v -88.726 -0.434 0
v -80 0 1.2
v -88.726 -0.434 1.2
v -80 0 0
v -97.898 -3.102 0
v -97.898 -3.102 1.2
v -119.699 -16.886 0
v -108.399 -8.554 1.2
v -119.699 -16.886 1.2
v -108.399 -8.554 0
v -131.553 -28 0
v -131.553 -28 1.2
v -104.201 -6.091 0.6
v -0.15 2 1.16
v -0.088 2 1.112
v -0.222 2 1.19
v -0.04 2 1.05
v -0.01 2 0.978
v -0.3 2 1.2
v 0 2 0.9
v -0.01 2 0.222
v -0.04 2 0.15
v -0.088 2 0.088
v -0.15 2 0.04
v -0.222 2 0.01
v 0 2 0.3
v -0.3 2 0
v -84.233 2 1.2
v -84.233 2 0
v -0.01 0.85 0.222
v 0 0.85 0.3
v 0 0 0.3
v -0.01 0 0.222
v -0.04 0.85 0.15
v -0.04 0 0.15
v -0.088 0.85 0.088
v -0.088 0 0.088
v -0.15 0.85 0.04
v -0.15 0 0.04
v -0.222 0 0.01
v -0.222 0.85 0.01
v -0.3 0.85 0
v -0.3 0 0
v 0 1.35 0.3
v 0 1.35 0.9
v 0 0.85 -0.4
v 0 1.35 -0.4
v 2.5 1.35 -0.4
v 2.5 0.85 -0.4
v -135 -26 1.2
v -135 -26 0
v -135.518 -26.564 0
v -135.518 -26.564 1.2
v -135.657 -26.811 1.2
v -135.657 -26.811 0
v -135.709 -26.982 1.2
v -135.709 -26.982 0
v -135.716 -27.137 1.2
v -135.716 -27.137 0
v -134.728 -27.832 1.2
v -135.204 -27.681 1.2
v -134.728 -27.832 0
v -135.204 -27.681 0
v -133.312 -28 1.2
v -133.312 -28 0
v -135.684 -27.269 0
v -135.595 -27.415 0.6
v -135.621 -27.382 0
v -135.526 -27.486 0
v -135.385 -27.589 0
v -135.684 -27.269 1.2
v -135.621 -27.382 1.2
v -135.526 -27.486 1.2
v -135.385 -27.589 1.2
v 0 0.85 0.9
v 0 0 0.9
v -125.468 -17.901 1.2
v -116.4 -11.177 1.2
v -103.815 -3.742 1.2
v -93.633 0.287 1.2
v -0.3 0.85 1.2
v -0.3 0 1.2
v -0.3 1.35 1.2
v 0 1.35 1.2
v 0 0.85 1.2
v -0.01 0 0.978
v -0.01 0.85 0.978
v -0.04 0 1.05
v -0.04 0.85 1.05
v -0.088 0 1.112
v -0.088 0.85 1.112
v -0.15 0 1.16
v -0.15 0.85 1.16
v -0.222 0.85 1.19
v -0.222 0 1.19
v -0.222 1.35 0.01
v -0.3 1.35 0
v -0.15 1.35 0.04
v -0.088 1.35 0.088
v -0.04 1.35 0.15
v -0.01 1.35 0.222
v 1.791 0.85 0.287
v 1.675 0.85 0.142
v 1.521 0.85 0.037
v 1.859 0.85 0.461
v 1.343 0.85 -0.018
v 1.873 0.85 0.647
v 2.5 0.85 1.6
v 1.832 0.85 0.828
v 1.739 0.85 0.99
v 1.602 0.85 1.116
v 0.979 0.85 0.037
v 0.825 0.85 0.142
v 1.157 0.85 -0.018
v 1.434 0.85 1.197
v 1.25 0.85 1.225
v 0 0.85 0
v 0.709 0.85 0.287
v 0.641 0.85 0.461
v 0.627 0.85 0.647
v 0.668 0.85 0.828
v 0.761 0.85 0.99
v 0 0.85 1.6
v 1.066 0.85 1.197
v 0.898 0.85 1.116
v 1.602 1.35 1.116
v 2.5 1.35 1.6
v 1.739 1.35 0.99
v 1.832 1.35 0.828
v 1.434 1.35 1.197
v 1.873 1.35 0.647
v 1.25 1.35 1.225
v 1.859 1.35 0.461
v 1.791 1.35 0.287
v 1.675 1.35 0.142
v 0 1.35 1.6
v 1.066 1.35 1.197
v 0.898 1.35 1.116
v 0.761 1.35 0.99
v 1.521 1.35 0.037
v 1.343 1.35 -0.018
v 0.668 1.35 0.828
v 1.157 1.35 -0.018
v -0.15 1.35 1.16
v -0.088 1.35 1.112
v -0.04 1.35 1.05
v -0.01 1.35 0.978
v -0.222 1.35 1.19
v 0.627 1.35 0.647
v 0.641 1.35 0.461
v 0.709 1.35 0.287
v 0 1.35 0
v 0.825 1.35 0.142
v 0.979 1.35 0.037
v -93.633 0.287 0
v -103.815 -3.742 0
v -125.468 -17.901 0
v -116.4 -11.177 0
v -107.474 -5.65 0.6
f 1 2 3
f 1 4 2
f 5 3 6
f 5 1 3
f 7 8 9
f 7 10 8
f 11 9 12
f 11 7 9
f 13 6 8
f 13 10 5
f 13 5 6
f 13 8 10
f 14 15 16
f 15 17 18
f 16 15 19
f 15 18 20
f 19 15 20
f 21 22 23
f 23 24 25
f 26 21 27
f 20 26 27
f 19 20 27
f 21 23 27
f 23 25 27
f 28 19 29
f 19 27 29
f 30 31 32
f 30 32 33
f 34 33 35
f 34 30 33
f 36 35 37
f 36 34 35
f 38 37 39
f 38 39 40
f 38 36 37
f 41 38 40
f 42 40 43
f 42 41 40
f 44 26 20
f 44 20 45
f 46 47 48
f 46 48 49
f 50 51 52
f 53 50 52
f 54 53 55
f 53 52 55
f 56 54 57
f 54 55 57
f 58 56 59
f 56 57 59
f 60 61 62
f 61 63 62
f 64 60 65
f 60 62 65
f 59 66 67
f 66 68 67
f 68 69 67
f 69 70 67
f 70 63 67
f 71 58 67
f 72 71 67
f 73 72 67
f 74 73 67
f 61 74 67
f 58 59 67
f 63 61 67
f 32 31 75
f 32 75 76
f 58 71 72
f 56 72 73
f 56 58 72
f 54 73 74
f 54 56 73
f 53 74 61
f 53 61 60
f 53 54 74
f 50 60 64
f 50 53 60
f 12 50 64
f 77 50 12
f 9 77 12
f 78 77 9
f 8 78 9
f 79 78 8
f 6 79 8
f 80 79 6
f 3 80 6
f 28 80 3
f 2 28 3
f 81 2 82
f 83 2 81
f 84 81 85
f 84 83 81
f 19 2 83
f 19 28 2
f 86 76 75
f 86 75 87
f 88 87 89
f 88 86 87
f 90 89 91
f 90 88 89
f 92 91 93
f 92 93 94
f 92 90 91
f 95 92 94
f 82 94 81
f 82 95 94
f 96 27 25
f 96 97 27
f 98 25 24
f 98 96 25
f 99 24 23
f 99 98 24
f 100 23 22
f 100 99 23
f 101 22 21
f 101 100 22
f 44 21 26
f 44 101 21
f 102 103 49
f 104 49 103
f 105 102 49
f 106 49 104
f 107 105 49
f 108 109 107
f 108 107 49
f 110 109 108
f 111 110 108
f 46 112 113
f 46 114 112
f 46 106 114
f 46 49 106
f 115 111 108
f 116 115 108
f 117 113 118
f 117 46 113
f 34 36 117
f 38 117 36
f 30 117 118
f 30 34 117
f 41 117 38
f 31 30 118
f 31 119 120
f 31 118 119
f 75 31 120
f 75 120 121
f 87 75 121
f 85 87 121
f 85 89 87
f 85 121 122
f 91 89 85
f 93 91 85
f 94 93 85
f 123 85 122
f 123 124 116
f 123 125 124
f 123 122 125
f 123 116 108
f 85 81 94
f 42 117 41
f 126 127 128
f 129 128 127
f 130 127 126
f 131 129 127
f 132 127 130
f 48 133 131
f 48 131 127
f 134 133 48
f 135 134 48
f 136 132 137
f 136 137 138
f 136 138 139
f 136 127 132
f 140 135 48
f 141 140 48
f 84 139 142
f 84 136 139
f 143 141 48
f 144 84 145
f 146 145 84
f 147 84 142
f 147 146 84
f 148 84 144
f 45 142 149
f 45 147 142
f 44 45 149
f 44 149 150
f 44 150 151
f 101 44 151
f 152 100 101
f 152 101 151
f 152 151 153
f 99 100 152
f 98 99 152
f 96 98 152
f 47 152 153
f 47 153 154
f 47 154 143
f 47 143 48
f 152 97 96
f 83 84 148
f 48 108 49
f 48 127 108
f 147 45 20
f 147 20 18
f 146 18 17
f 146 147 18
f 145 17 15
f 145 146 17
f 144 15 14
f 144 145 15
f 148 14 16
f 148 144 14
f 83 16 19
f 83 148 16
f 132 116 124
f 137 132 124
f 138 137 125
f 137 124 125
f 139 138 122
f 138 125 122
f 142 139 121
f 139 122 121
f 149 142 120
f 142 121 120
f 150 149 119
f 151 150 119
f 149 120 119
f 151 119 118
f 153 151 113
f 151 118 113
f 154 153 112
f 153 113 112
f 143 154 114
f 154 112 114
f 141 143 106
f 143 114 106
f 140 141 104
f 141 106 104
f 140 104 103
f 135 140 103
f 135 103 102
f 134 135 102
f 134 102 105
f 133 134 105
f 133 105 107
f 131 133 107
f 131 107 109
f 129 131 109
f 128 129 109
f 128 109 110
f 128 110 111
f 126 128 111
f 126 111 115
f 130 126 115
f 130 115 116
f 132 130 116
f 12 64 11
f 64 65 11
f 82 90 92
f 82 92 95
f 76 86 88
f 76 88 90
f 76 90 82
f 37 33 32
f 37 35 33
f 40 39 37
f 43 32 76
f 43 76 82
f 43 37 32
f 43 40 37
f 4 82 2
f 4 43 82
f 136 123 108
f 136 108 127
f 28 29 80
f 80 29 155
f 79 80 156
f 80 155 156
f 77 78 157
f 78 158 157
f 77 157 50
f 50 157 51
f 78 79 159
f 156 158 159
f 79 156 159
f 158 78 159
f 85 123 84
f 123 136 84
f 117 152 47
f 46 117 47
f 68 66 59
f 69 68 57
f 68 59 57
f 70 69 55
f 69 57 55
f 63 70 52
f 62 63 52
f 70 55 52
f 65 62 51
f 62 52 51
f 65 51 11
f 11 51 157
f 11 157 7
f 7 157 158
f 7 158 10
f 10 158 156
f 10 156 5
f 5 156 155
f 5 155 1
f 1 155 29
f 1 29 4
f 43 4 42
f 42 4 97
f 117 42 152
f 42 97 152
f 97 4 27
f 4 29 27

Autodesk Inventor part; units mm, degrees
ref_plane "YZ Plane" through (0, 0, 0) normal (1, 0, 0) x (0, 1, 0)
ref_plane "XZ Plane" through (0, 0, 0) normal (0, 1, 0) x (-1, 0, 0)
ref_plane "XY Plane" through (0, 0, 0) normal (0, 0, 1) x (1, 0, 0)
sketch "Sketch1" plane through (0, 0, 0) normal (0, 0, 1) x (1, 0, 0)
  line L0 (0, 0) -> (-80, 0)
  line L1 (-80, 2) -> (0, 2)
  line L2 (0, 2) -> (0, 0)
  line L3 (-80, 2) -> (-84.2329, 2)
  line L4 (-133.3122, -28) -> (-131.553, -28)
  spline S0 degree 2 poles (-80, 0) (-102.6249, 1.8185) (-131.553, -28) knots 0 0 0 1 1 1
  spline S1 degree 2 poles (-80, 2) (-102.2926, 3.4342) (-135, -26) knots 0 0 0 1 1 1
  spline S2 degree 2 poles (-135, -26) (-137.4492, -28.2041) (-131.553, -28) knots 0 0 0 1 1 1
  line L5 (0, 1.35) -> (0, 1)
  line L6 (0, 0.65) -> (0, 1)
  point P0 (-99.9996, -4.0002)
  point P1 (-100, -1)
  point P2 (-100, -2)
  dimension "d1" = 2
extrude "Extrusion1" add sketch "Sketch1" along normal blind 1.2 contours L0 S0 L4 S2 S1 L3 L1 L2
sketch "Sketch2" plane through (0, 0, 0) normal (1, 0, 0) x (0, 0, -1)
  line L0 (-1.2, 0) -> (-1.2, 2) projected
  line L1 (0, 0) -> (0, 2) projected
  line L2 (0, 2) -> (-1.2, 2) projected
  line L3 (0.4, 0.85) -> (-1.6, 0.85)
  line L4 (-1.6, 0.85) -> (-1.6, 1.35)
  line L5 (-1.6, 1.35) -> (0.4, 1.35)
  line L6 (0.4, 1.35) -> (0.4, 0.85)
  line L7 (0.4, 0.85) -> (-1.6, 1.35) construction
  line L8 (-1.6, 0.85) -> (0.4, 1.35) construction
  point P0 (-0.6, 1.1)
  dimension "d12" = 2
  dimension "d13" = 0.5
extrude "Extrusion2" add sketch "Sketch2" along normal blind 2.5 contours L3 L4 L5 L0 | L0 L5 L1 L3 | L1 L5 L6 L3
sketch "Sketch3" plane through (0, 1.35, 0) normal (0, 1, 0) x (1, 0, 0)
  line L0 (0, 0) -> (0, -1.2) projected
  line L1 (0, 0.4) -> (2.5, 0.4) projected
  point P0 (1.25, -0.6)
hole "Hole1" at (1.25, 1.35, 0.6) direction (0, -1, 0) diameter 1.25 depth 0.7
fillet "Fillet1" radius 0.3 4 edges at (0, 1.675, 1.2) (0, 1.675, 0) (0, 0.425, 1.2) (0, 0.425, 0)
properties part number "brat bun ochelari" material "Iron, Cast"
